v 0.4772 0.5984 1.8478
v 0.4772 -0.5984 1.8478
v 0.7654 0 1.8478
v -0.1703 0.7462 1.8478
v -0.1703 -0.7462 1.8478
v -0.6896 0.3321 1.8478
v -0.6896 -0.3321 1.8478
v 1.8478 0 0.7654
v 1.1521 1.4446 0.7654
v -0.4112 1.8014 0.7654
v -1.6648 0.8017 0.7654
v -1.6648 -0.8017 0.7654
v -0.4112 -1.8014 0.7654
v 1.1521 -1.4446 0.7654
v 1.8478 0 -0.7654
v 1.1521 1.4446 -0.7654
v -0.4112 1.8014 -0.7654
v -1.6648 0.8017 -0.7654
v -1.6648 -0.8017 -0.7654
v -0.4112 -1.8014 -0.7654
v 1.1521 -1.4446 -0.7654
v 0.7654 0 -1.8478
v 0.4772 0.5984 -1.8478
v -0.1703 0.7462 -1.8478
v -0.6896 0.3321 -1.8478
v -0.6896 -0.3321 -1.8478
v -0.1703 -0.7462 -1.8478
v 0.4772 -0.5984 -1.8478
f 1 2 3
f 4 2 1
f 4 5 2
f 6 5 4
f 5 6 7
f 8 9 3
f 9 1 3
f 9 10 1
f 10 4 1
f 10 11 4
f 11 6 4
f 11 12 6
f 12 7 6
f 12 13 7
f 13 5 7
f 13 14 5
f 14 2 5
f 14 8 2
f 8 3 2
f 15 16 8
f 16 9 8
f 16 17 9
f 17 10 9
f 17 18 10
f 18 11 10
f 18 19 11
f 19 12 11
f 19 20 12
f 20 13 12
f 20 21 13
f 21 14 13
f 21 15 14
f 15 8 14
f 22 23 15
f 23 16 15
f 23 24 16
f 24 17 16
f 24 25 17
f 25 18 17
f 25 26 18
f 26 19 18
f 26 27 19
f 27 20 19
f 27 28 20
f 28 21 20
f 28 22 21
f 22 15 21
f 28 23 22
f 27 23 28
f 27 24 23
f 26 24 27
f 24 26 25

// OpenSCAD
/*
<json>
    {
        "Name": "Item 0",
        "Desc": "Desc 0",
        "LowKeyword": "Lost",
        "HighKeyword": "Printed",
        "varBase": "Var0",
        "minDefault": 1,
        "maxDefault": 2,
        "minDefaultND": "nozzleDiameter",
        "maxDefaultND": "2 * nozzleDiameter",
        "cameraData": "-2.28,2.59,6.06,59.9,0,13.8,113.4",
        "sortOrder": 0,
		"instanceCount": 10
    }
</json>
*/

sphere(d=4);

/*
<json>
    {
        "Name": "Item 1",
        "Desc": "Desc 1",
        "LowKeyword": "Lost",
        "HighKeyword": "Printed",
        "varBase": "Var1",
        "minDefault": 3,
        "maxDefault": 4,
        "minDefaultND": "3 * nozzleDiameter",
        "maxDefaultND": "4 * nozzleDiameter",
        "cameraData": "-2.28,2.59,6.06,59.9,0,13.8,113.4",
        "sortOrder": 0,
		"instanceCount": 10
    }
</json>
*/

/*
<json>
    {
        "Name": "Item 2",
        "Desc": "Desc 2",
        "LowKeyword": "Lost",
        "HighKeyword": "Printed",
        "varBase": "Var2",
        "minDefault": "layerHeight",
        "maxDefault": "2 * layerHeight",
        "minDefaultND": "5 * nozzleDiameter",
        "maxDefaultND": "6 * nozzleDiameter",
        "cameraData": "-2.28,2.59,6.06,59.9,0,13.8,113.4",
        "sortOrder": 0,
		"instanceCount": 10
    }
</json>
*/
